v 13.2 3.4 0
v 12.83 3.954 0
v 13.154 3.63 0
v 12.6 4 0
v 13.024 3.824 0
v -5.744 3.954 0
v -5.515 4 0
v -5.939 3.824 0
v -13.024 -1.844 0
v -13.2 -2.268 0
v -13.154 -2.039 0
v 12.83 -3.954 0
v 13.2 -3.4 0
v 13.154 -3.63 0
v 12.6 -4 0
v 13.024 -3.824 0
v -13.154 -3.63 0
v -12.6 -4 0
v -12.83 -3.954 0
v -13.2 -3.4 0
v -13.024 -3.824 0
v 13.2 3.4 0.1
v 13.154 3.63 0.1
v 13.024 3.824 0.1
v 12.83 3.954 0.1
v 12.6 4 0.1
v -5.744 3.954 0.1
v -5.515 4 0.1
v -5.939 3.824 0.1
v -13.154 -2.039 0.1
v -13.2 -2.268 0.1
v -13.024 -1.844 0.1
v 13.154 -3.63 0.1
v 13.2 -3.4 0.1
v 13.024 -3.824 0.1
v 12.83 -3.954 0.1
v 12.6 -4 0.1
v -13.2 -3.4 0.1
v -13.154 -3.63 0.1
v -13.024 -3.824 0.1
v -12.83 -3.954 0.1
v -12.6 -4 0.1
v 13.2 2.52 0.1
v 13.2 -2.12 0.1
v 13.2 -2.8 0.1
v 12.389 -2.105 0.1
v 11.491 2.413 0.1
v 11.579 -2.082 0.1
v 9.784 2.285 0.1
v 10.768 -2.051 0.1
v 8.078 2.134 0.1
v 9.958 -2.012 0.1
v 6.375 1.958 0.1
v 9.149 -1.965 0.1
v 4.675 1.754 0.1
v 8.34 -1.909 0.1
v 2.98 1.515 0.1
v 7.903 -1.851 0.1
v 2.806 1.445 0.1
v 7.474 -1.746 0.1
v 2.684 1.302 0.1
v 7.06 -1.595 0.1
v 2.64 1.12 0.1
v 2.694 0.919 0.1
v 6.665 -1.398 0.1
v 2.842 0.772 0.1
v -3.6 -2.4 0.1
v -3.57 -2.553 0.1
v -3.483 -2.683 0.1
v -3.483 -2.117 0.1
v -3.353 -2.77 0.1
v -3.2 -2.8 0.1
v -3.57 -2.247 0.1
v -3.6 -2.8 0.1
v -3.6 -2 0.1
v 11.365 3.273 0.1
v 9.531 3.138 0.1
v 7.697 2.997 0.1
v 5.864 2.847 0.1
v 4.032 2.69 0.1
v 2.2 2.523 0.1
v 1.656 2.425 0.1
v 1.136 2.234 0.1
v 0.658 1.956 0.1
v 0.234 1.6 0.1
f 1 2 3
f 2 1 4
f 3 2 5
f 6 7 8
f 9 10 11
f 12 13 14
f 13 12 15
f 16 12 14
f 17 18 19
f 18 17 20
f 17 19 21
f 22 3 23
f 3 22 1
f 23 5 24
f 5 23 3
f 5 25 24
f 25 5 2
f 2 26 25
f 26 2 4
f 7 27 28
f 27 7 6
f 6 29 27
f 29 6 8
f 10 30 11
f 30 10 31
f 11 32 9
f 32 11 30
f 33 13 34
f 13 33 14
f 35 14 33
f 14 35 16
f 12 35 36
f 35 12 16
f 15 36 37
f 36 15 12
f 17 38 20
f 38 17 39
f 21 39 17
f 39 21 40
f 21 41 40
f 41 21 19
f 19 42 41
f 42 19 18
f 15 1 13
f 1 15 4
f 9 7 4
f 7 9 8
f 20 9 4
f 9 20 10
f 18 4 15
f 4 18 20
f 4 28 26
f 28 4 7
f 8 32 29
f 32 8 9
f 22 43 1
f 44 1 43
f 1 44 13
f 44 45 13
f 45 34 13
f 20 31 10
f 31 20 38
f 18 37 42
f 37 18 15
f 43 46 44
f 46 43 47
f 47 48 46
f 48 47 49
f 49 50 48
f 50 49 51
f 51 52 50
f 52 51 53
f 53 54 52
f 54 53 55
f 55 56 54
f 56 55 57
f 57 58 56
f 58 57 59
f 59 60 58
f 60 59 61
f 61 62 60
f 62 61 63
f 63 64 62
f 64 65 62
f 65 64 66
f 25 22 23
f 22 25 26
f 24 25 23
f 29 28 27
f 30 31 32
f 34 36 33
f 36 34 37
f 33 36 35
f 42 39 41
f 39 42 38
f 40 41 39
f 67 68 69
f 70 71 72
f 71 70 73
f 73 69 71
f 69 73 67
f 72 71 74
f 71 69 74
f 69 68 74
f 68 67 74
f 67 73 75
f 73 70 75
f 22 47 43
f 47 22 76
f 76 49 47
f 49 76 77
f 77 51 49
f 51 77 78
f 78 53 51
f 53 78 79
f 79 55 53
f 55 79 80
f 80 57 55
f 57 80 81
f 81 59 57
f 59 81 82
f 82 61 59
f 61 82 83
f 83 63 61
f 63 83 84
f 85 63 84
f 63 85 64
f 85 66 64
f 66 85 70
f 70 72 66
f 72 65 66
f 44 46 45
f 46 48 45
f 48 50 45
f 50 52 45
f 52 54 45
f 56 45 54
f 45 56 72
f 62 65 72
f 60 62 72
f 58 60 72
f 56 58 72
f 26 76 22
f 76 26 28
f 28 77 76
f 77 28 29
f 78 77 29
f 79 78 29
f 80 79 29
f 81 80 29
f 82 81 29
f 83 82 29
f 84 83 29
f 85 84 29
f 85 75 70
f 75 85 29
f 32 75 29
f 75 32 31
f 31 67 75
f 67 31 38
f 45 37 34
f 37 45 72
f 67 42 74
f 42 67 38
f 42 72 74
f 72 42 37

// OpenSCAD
// file: ../p/1-8cyli.scad
use <../lib.scad>
function ldraw_lib__1_8cyli() = [
// 0 Cylinder 0.125
// 0 Name: 1-8cyli.dat
// 0 Author: James Jessiman
// 0 !LDRAW_ORG Primitive UPDATE 2005-01
// 0 !LICENSE Licensed under CC BY 4.0 : see CAreadme.txt
// 
// 0 BFC CERTIFY CCW
  [0,"BFC","CERTIFY"],
  [0,"BFC","CCW"],
// 
// 0 !HISTORY 2002-04-25 [PTadmin] Official Update 2002-02
// 0 !HISTORY 2004-12-11 [nielsk] Recreated using Primitive Generator, Edge lines fixed, BFC changed to CCW
// 0 !HISTORY 2005-12-28 [PTadmin] Official Update 2005-01
// 0 !HISTORY 2007-06-22 [PTadmin] Header formatted for Contributor Agreement
// 0 !HISTORY 2008-07-01 [PTadmin] Official Update 2008-01
// 
// 
// 4 16 .9239 1 .3827 .9239 0 .3827 1 0 0 1 1 0
  [4,16,.9239,1,.3827,.9239,0,.3827,1,0,0,1,1,0],
// 4 16 .7071 1 .7071 .7071 0 .7071 .9239 0 .3827 .9239 1 .3827
  [4,16,.7071,1,.7071,.7071,0,.7071,.9239,0,.3827,.9239,1,.3827],
// 5 24 1 1 0 1 0 0 1 1 -.4142 .9239 1 .3827
  [5,24,1,1,0,1,0,0,1,1,-.4142,.9239,1,.3827],
// 5 24 .9239 1 .3827 .9239 0 .3827 1 1 0 .7071 1 .7071
  [5,24,.9239,1,.3827,.9239,0,.3827,1,1,0,.7071,1,.7071],
// 5 24 .7071 1 .7071 .7071 0 .7071 .9239 1 .3827 .4142 1 1
  [5,24,.7071,1,.7071,.7071,0,.7071,.9239,1,.3827,.4142,1,1],
// 0
];
module ldraw_lib__1_8cyli(step=0, col=false, unit=2/5, alt=false, line=0.2, solid=!$preview)
    makepoly(ldraw_lib__1_8cyli(), step=step, col=col, unit=unit, alt=alt, line=line, solid=solid);
ldraw_lib__1_8cyli(line=0.2);
// file: ../p/1-4cyli.scad
use <../lib.scad>
function ldraw_lib__1_4cyli() = [
// 0 Cylinder 0.25
// 0 Name: 1-4cyli.dat
// 0 Author: James Jessiman
// 0 !LDRAW_ORG Primitive UPDATE 2012-01
// 0 !LICENSE Licensed under CC BY 4.0 : see CAreadme.txt
// 
// 0 BFC CERTIFY CCW
  [0,"BFC","CERTIFY"],
  [0,"BFC","CCW"],
// 
// 0 !HISTORY 2002-03-23 [sbliss] Added BFC statement.
// 0 !HISTORY 2002-04-25 [PTadmin] Official Update 2002-02
// 0 !HISTORY 2007-06-22 [PTadmin] Header formatted for Contributor Agreement
// 0 !HISTORY 2008-07-01 [PTadmin] Official Update 2008-01
// 0 !HISTORY 2012-02-16 [Philo] Changed to CCW
// 0 !HISTORY 2012-03-30 [PTadmin] Official Update 2012-01
// 
// 
// 4 16 1 1 0 0.9239 1 0.3827 0.9239 0 0.3827 1 0 0
  [4,16,1,1,0,0.9239,1,0.3827,0.9239,0,0.3827,1,0,0],
// 5 24 1 0 0 1 1 0 0.9239 0 0.3827 1 0 -1
  [5,24,1,0,0,1,1,0,0.9239,0,0.3827,1,0,-1],
// 4 16 0.9239 1 0.3827 0.7071 1 0.7071 0.7071 0 0.7071 0.9239 0 0.3827
  [4,16,0.9239,1,0.3827,0.7071,1,0.7071,0.7071,0,0.7071,0.9239,0,0.3827],
// 5 24 0.9239 0 0.3827 0.9239 1 0.3827 0.7071 0 0.7071 1 0 0
  [5,24,0.9239,0,0.3827,0.9239,1,0.3827,0.7071,0,0.7071,1,0,0],
// 4 16 0.7071 1 0.7071 0.3827 1 0.9239 0.3827 0 0.9239 0.7071 0 0.7071
  [4,16,0.7071,1,0.7071,0.3827,1,0.9239,0.3827,0,0.9239,0.7071,0,0.7071],
// 5 24 0.7071 0 0.7071 0.7071 1 0.7071 0.3827 0 0.9239 0.9239 0 0.3827
  [5,24,0.7071,0,0.7071,0.7071,1,0.7071,0.3827,0,0.9239,0.9239,0,0.3827],
// 4 16 0.3827 1 0.9239 0 1 1 0 0 1 0.3827 0 0.9239
  [4,16,0.3827,1,0.9239,0,1,1,0,0,1,0.3827,0,0.9239],
// 5 24 0.3827 0 0.9239 0.3827 1 0.9239 0 0 1 0.7071 0 0.7071
  [5,24,0.3827,0,0.9239,0.3827,1,0.9239,0,0,1,0.7071,0,0.7071],
// 5 24 0 0 1 0 1 1 0.3827 0 0.9239 -1 0 1
  [5,24,0,0,1,0,1,1,0.3827,0,0.9239,-1,0,1],
];
module ldraw_lib__1_4cyli(step=0, col=false, unit=2/5, alt=false, line=0.2, solid=!$preview)
    makepoly(ldraw_lib__1_4cyli(), step=step, col=col, unit=unit, alt=alt, line=line, solid=solid);
ldraw_lib__1_4cyli(line=0.2);
// file: s/stickerback010x033a.scad
use <../../lib.scad>
use <../../p/1-4chrd.scad>
use <../../p/1-4cyli.scad>
use <../../p/1-8chrd.scad>
use <../../p/1-8cyli.scad>
function ldraw_lib__s__stickerback010x033a() = [
// 0 ~Sticker Back  1.0 x  3.3 Irregular
// 0 Name: s\stickerback010x033a.dat
// 0 Author: Massimo Maso [Sirio]
// 0 !LDRAW_ORG Subpart UPDATE 2025-08
// 0 !LICENSE Licensed under CC BY 4.0 : see CAreadme.txt
// 
// 0 BFC CERTIFY CCW
  [0,"BFC","CERTIFY"],
  [0,"BFC","CCW"],
// 
// 0 !HISTORY 2025-08-31 [OrionP] Official Update 2025-08
// 
// 0 // Primitives
// 1 16 -31.5 0 8.5 -1.5 0 0 0 -1 0 0 0 1.5 1-4chrd.dat
  [1,16,-31.5,0,8.5,-1.5,0,0,0,-1,0,0,0,1.5, ldraw_lib__1_4chrd()],
// 1 16 13.787 0 8.5 0 0 1.5 0 -1 0 1.5 0 0 1-8chrd.dat
  [1,16,13.787,0,8.5,0,0,1.5,0,-1,0,1.5,0,0, ldraw_lib__1_8chrd()],
// 1 16 31.5 0 -5.6704 1.5 0 0 0 -1 0 0 0 1.5 1-8chrd.dat
  [1,16,31.5,0,-5.6704,1.5,0,0,0,-1,0,0,0,1.5, ldraw_lib__1_8chrd()],
// 1 16 -31.5 0 -8.5 -1.5 0 0 0 -1 0 0 0 -1.5 1-4chrd.dat
  [1,16,-31.5,0,-8.5,-1.5,0,0,0,-1,0,0,0,-1.5, ldraw_lib__1_4chrd()],
// 1 16 31.5 0 -8.5 1.5 0 0 0 -1 0 0 0 -1.5 1-4chrd.dat
  [1,16,31.5,0,-8.5,1.5,0,0,0,-1,0,0,0,-1.5, ldraw_lib__1_4chrd()],
// 1 16 -31.5 0 8.5 -1.5 0 0 0 -.25 0 0 0 1.5 1-4cyli.dat
  [1,16,-31.5,0,8.5,-1.5,0,0,0,-.25,0,0,0,1.5, ldraw_lib__1_4cyli()],
// 1 16 13.787 0 8.5 0 0 1.5 0 -.25 0 1.5 0 0 1-8cyli.dat
  [1,16,13.787,0,8.5,0,0,1.5,0,-.25,0,1.5,0,0, ldraw_lib__1_8cyli()],
// 1 16 31.5 0 -5.6704 1.5 0 0 0 -.25 0 0 0 1.5 1-8cyli.dat
  [1,16,31.5,0,-5.6704,1.5,0,0,0,-.25,0,0,0,1.5, ldraw_lib__1_8cyli()],
// 1 16 -31.5 0 -8.5 -1.5 0 0 0 -.25 0 0 0 -1.5 1-4cyli.dat
  [1,16,-31.5,0,-8.5,-1.5,0,0,0,-.25,0,0,0,-1.5, ldraw_lib__1_4cyli()],
// 1 16 31.5 0 -8.5 1.5 0 0 0 -.25 0 0 0 -1.5 1-4cyli.dat
  [1,16,31.5,0,-8.5,1.5,0,0,0,-.25,0,0,0,-1.5, ldraw_lib__1_4cyli()],
// 0 // Bottom faces
// 4 16 -31.5 0 10 -31.5 0 -10 -33 0 -8.5 -33 0 8.5
  [4,16,-31.5,0,10,-31.5,0,-10,-33,0,-8.5,-33,0,8.5],
// 4 16 -31.5 0 10 13.787 0 10 14.8477 0 9.5607 32.5607 0 -4.6098
  [4,16,-31.5,0,10,13.787,0,10,14.8477,0,9.5607,32.5607,0,-4.6098],
// 4 16 -31.5 0 10 32.5607 0 -4.6098 33 0 -5.6704 33 0 -8.5
  [4,16,-31.5,0,10,32.5607,0,-4.6098,33,0,-5.6704,33,0,-8.5],
// 4 16 -31.5 0 10 33 0 -8.5 31.5 0 -10 -31.5 0 -10
  [4,16,-31.5,0,10,33,0,-8.5,31.5,0,-10,-31.5,0,-10],
// 0 // Lateral faces
// 4 16 -31.5 0 10 -31.5 -.25 10 13.787 -.25 10 13.787 0 10
  [4,16,-31.5,0,10,-31.5,-.25,10,13.787,-.25,10,13.787,0,10],
// 4 16 14.8477 0 9.5607 14.8477 -.25 9.5607 32.5607 -.25 -4.6098 32.5607 0 -4.6098
  [4,16,14.8477,0,9.5607,14.8477,-.25,9.5607,32.5607,-.25,-4.6098,32.5607,0,-4.6098],
// 3 16 -33 0 8.5 -33 -.25 6.3 -33 -.25 8.5
  [3,16,-33,0,8.5,-33,-.25,6.3,-33,-.25,8.5],
// 4 16 -33 0 8.5 -33 0 -8.5 -33 -.25 -5.3 -33 -.25 6.3
  [4,16,-33,0,8.5,-33,0,-8.5,-33,-.25,-5.3,-33,-.25,6.3],
// 3 16 -33 0 -8.5 -33 -.25 -7 -33 -.25 -5.3
  [3,16,-33,0,-8.5,-33,-.25,-7,-33,-.25,-5.3],
// 3 16 -33 0 -8.5 -33 -.25 -8.5 -33 -.25 -7
  [3,16,-33,0,-8.5,-33,-.25,-8.5,-33,-.25,-7],
// 4 16 33 0 -5.6704 33 -.25 -5.6704 33 -.25 -8.5 33 0 -8.5
  [4,16,33,0,-5.6704,33,-.25,-5.6704,33,-.25,-8.5,33,0,-8.5],
// 4 16 -31.5 0 -10 31.5 0 -10 31.5 -.25 -10 -31.5 -.25 -10
  [4,16,-31.5,0,-10,31.5,0,-10,31.5,-.25,-10,-31.5,-.25,-10],
// 0 // Conditional lines
// 5 24 14.8477 -.25 9.5607 14.8477 0 9.5607 14.3611 -.25 9.8859 32.5607 -.25 -4.6098
  [5,24,14.8477,-.25,9.5607,14.8477,0,9.5607,14.3611,-.25,9.8859,32.5607,-.25,-4.6098],
// 5 24 32.5607 -.25 -4.6098 32.5607 0 -4.6098 32.8859 -.25 -5.0964 14.8477 -.25 9.5607
  [5,24,32.5607,-.25,-4.6098,32.5607,0,-4.6098,32.8859,-.25,-5.0964,14.8477,-.25,9.5607],
];
module ldraw_lib__s__stickerback010x033a(step=0, col=false, unit=2/5, alt=false, line=0.2, solid=!$preview)
    makepoly(ldraw_lib__s__stickerback010x033a(), step=step, col=col, unit=unit, alt=alt, line=line, solid=solid);
ldraw_lib__s__stickerback010x033a(line=0.2);
// file: ../p/3-8ndis.scad
use <../lib.scad>
function ldraw_lib__3_8ndis() = [
// 0 Disc Negative 0.375
// 0 Name: 3-8ndis.dat
// 0 Author: Alex Taylor [anathema]
// 0 !LDRAW_ORG Primitive UPDATE 2009-02
// 0 !LICENSE Licensed under CC BY 4.0 : see CAreadme.txt
// 
// 0 BFC CERTIFY CCW
  [0,"BFC","CERTIFY"],
  [0,"BFC","CCW"],
// 
// 0 !HISTORY 2009-09-03 [PTadmin] Official Update 2009-02
// 
// 
// 3 16 1 0 1 0.9239 0 0.3827 1 0 0
  [3,16,1,0,1,0.9239,0,0.3827,1,0,0],
// 3 16 1 0 1 0.7071 0 0.7071 0.9239 0 0.3827
  [3,16,1,0,1,0.7071,0,0.7071,0.9239,0,0.3827],
// 3 16 1 0 1 0.3827 0 0.9239 0.7071 0 0.7071
  [3,16,1,0,1,0.3827,0,0.9239,0.7071,0,0.7071],
// 3 16 1 0 1 0 0 1 0.3827 0 0.9239
  [3,16,1,0,1,0,0,1,0.3827,0,0.9239],
// 3 16 -1 0 1 -0.3827 0 0.9239 0 0 1
  [3,16,-1,0,1,-0.3827,0,0.9239,0,0,1],
// 3 16 -1 0 1 -0.7071 0 0.7071 -0.3827 0 0.9239
  [3,16,-1,0,1,-0.7071,0,0.7071,-0.3827,0,0.9239],
// 0
];
module ldraw_lib__3_8ndis(step=0, col=false, unit=2/5, alt=false, line=0.2, solid=!$preview)
    makepoly(ldraw_lib__3_8ndis(), step=step, col=col, unit=unit, alt=alt, line=line, solid=solid);
ldraw_lib__3_8ndis(line=0.2);
// file: ../p/3-8chrd.scad
use <../lib.scad>
function ldraw_lib__3_8chrd() = [
// 0 Chord 0.375
// 0 Name: 3-8chrd.dat
// 0 Author: Donald Sutter [technog]
// 0 !LDRAW_ORG Primitive UPDATE 2005-01
// 0 !LICENSE Licensed under CC BY 4.0 : see CAreadme.txt
// 
// 0 BFC CERTIFY CCW
  [0,"BFC","CERTIFY"],
  [0,"BFC","CCW"],
// 
// 0 !HISTORY 2004-01-07 [Steffen] added primitive code for POVray
// 0 !HISTORY 2004-03-18 [mkennedy] removed pov code and rearanged polygons.
// 0 !HISTORY 2004-09-12 [cwdee] reversed winding and standardised precision
// 0 !HISTORY 2005-12-28 [PTadmin] Official Update 2005-01
// 0 !HISTORY 2007-06-24 [PTadmin] Header formatted for Contributor Agreement
// 0 !HISTORY 2008-07-01 [PTadmin] Official Update 2008-01
// 
// 
// 3 16 0.7071 0 0.7071 0.3827 0 0.9239 0 0 1
  [3,16,0.7071,0,0.7071,0.3827,0,0.9239,0,0,1],
// 4 16 0.9239 0 0.3827 -0.3827 0 0.9239 -0.7071 0 0.7071 1 0 0
  [4,16,0.9239,0,0.3827,-0.3827,0,0.9239,-0.7071,0,0.7071,1,0,0],
// 4 16 0.7071 0 0.7071 0 0 1 -0.3827 0 0.9239 0.9239 0 0.3827
  [4,16,0.7071,0,0.7071,0,0,1,-0.3827,0,0.9239,0.9239,0,0.3827],
// 0
];
module ldraw_lib__3_8chrd(step=0, col=false, unit=2/5, alt=false, line=0.2, solid=!$preview)
    makepoly(ldraw_lib__3_8chrd(), step=step, col=col, unit=unit, alt=alt, line=line, solid=solid);
ldraw_lib__3_8chrd(line=0.2);
// file: ../p/1-8chrd.scad
use <../lib.scad>
function ldraw_lib__1_8chrd() = [
// 0 Chord 0.125
// 0 Name: 1-8chrd.dat
// 0 Author: Orion Pobursky [OrionP]
// 0 !LDRAW_ORG Primitive UPDATE 2023-05
// 0 !LICENSE Licensed under CC BY 4.0 : see CAreadme.txt
// 
// 0 BFC CERTIFY CCW
  [0,"BFC","CERTIFY"],
  [0,"BFC","CCW"],
// 
// 0 !HISTORY 2004-04-22 [PTadmin] Official Update 2004-02
// 0 !HISTORY 2007-06-22 [PTadmin] Header formatted for Contributor Agreement
// 0 !HISTORY 2008-07-01 [PTadmin] Official Update 2008-01
// 0 !HISTORY 2023-10-27 [OrionP] Rebuilt with PrimGen2, original author westrate
// 0 !HISTORY 2023-10-31 [OrionP] Official Update 2023-05
// 
// 3 16 1 0 0 0.9239 0 0.3827 0.7071 0 0.7071
  [3,16,1,0,0,0.9239,0,0.3827,0.7071,0,0.7071],
];
module ldraw_lib__1_8chrd(step=0, col=false, unit=2/5, alt=false, line=0.2, solid=!$preview)
    makepoly(ldraw_lib__1_8chrd(), step=step, col=col, unit=unit, alt=alt, line=line, solid=solid);
ldraw_lib__1_8chrd(line=0.2);
// file: ../p/1-4chrd.scad
use <../lib.scad>
function ldraw_lib__1_4chrd() = [
// 0 Chord 0.25
// 0 Name: 1-4chrd.dat
// 0 Author: Max Martin Richter [MMR1988]
// 0 !LDRAW_ORG Primitive UPDATE 2023-05
// 0 !LICENSE Licensed under CC BY 4.0 : see CAreadme.txt
// 
// 0 BFC CERTIFY CCW
  [0,"BFC","CERTIFY"],
  [0,"BFC","CCW"],
// 
// 0 !HISTORY 2004-04-22 [PTadmin] Official Update 2004-02
// 0 !HISTORY 2007-10-09 [PTadmin] Header formatted for Contributor Agreement
// 0 !HISTORY 2008-07-01 [PTadmin] Official Update 2008-01
// 0 !HISTORY 2012-08-02 [MMR1988] Re-creation with PrimGen2 and Rectifier
// 0 !HISTORY 2012-08-09 [PTadmin] Official Update 2012-02
// 0 !HISTORY 2023-10-27 [OrionP] Change author to MMR1988 from hafhead
// 0 !HISTORY 2023-10-31 [OrionP] Official Update 2023-05
// 
// 4 16 0.9239 0 0.3827 0.3827 0 0.9239 0 0 1 1 0 0
  [4,16,0.9239,0,0.3827,0.3827,0,0.9239,0,0,1,1,0,0],
// 3 16 0.7071 0 0.7071 0.3827 0 0.9239 0.9239 0 0.3827
  [3,16,0.7071,0,0.7071,0.3827,0,0.9239,0.9239,0,0.3827],
];
module ldraw_lib__1_4chrd(step=0, col=false, unit=2/5, alt=false, line=0.2, solid=!$preview)
    makepoly(ldraw_lib__1_4chrd(), step=step, col=col, unit=unit, alt=alt, line=line, solid=solid);
ldraw_lib__1_4chrd(line=0.2);
// main file
use <../lib.scad>
use <6254024q.scad>
function ldraw_lib__6254024t() = [
// 0 Sticker  1.0 x  3.3 with Black Triangle and Grey Trapezoid on Transparent Background Left
// 0 Name: 6254024t.dat
// 0 Author: Massimo Maso [Sirio]
// 0 !LDRAW_ORG Part UPDATE 2025-08
// 0 !LICENSE Licensed under CC BY 4.0 : see CAreadme.txt
// 
// 0 BFC CERTIFY CCW
  [0,"BFC","CERTIFY"],
  [0,"BFC","CCW"],
// 
// 0 !KEYWORDS BrickLink 75892stk01, McLaren, Rebrickable 49144, Senna, Set 75892
// 0 !KEYWORDS Speed Champions
// 
// 0 !HISTORY 2025-08-31 [OrionP] Official Update 2025-08
// 
// 1 16 0 0 0 -1 0 0 0 1 0 0 0 1 6254024q.dat
  [1,16,0,0,0,-1,0,0,0,1,0,0,0,1, ldraw_lib__6254024q()],
];
module ldraw_lib__6254024t(step=0, col=false, unit=2/5, alt=false, line=0.2, solid=!$preview)
    makepoly(ldraw_lib__6254024t(), step=step, col=col, unit=unit, alt=alt, line=line, solid=solid);
ldraw_lib__6254024t(line=0.2);
